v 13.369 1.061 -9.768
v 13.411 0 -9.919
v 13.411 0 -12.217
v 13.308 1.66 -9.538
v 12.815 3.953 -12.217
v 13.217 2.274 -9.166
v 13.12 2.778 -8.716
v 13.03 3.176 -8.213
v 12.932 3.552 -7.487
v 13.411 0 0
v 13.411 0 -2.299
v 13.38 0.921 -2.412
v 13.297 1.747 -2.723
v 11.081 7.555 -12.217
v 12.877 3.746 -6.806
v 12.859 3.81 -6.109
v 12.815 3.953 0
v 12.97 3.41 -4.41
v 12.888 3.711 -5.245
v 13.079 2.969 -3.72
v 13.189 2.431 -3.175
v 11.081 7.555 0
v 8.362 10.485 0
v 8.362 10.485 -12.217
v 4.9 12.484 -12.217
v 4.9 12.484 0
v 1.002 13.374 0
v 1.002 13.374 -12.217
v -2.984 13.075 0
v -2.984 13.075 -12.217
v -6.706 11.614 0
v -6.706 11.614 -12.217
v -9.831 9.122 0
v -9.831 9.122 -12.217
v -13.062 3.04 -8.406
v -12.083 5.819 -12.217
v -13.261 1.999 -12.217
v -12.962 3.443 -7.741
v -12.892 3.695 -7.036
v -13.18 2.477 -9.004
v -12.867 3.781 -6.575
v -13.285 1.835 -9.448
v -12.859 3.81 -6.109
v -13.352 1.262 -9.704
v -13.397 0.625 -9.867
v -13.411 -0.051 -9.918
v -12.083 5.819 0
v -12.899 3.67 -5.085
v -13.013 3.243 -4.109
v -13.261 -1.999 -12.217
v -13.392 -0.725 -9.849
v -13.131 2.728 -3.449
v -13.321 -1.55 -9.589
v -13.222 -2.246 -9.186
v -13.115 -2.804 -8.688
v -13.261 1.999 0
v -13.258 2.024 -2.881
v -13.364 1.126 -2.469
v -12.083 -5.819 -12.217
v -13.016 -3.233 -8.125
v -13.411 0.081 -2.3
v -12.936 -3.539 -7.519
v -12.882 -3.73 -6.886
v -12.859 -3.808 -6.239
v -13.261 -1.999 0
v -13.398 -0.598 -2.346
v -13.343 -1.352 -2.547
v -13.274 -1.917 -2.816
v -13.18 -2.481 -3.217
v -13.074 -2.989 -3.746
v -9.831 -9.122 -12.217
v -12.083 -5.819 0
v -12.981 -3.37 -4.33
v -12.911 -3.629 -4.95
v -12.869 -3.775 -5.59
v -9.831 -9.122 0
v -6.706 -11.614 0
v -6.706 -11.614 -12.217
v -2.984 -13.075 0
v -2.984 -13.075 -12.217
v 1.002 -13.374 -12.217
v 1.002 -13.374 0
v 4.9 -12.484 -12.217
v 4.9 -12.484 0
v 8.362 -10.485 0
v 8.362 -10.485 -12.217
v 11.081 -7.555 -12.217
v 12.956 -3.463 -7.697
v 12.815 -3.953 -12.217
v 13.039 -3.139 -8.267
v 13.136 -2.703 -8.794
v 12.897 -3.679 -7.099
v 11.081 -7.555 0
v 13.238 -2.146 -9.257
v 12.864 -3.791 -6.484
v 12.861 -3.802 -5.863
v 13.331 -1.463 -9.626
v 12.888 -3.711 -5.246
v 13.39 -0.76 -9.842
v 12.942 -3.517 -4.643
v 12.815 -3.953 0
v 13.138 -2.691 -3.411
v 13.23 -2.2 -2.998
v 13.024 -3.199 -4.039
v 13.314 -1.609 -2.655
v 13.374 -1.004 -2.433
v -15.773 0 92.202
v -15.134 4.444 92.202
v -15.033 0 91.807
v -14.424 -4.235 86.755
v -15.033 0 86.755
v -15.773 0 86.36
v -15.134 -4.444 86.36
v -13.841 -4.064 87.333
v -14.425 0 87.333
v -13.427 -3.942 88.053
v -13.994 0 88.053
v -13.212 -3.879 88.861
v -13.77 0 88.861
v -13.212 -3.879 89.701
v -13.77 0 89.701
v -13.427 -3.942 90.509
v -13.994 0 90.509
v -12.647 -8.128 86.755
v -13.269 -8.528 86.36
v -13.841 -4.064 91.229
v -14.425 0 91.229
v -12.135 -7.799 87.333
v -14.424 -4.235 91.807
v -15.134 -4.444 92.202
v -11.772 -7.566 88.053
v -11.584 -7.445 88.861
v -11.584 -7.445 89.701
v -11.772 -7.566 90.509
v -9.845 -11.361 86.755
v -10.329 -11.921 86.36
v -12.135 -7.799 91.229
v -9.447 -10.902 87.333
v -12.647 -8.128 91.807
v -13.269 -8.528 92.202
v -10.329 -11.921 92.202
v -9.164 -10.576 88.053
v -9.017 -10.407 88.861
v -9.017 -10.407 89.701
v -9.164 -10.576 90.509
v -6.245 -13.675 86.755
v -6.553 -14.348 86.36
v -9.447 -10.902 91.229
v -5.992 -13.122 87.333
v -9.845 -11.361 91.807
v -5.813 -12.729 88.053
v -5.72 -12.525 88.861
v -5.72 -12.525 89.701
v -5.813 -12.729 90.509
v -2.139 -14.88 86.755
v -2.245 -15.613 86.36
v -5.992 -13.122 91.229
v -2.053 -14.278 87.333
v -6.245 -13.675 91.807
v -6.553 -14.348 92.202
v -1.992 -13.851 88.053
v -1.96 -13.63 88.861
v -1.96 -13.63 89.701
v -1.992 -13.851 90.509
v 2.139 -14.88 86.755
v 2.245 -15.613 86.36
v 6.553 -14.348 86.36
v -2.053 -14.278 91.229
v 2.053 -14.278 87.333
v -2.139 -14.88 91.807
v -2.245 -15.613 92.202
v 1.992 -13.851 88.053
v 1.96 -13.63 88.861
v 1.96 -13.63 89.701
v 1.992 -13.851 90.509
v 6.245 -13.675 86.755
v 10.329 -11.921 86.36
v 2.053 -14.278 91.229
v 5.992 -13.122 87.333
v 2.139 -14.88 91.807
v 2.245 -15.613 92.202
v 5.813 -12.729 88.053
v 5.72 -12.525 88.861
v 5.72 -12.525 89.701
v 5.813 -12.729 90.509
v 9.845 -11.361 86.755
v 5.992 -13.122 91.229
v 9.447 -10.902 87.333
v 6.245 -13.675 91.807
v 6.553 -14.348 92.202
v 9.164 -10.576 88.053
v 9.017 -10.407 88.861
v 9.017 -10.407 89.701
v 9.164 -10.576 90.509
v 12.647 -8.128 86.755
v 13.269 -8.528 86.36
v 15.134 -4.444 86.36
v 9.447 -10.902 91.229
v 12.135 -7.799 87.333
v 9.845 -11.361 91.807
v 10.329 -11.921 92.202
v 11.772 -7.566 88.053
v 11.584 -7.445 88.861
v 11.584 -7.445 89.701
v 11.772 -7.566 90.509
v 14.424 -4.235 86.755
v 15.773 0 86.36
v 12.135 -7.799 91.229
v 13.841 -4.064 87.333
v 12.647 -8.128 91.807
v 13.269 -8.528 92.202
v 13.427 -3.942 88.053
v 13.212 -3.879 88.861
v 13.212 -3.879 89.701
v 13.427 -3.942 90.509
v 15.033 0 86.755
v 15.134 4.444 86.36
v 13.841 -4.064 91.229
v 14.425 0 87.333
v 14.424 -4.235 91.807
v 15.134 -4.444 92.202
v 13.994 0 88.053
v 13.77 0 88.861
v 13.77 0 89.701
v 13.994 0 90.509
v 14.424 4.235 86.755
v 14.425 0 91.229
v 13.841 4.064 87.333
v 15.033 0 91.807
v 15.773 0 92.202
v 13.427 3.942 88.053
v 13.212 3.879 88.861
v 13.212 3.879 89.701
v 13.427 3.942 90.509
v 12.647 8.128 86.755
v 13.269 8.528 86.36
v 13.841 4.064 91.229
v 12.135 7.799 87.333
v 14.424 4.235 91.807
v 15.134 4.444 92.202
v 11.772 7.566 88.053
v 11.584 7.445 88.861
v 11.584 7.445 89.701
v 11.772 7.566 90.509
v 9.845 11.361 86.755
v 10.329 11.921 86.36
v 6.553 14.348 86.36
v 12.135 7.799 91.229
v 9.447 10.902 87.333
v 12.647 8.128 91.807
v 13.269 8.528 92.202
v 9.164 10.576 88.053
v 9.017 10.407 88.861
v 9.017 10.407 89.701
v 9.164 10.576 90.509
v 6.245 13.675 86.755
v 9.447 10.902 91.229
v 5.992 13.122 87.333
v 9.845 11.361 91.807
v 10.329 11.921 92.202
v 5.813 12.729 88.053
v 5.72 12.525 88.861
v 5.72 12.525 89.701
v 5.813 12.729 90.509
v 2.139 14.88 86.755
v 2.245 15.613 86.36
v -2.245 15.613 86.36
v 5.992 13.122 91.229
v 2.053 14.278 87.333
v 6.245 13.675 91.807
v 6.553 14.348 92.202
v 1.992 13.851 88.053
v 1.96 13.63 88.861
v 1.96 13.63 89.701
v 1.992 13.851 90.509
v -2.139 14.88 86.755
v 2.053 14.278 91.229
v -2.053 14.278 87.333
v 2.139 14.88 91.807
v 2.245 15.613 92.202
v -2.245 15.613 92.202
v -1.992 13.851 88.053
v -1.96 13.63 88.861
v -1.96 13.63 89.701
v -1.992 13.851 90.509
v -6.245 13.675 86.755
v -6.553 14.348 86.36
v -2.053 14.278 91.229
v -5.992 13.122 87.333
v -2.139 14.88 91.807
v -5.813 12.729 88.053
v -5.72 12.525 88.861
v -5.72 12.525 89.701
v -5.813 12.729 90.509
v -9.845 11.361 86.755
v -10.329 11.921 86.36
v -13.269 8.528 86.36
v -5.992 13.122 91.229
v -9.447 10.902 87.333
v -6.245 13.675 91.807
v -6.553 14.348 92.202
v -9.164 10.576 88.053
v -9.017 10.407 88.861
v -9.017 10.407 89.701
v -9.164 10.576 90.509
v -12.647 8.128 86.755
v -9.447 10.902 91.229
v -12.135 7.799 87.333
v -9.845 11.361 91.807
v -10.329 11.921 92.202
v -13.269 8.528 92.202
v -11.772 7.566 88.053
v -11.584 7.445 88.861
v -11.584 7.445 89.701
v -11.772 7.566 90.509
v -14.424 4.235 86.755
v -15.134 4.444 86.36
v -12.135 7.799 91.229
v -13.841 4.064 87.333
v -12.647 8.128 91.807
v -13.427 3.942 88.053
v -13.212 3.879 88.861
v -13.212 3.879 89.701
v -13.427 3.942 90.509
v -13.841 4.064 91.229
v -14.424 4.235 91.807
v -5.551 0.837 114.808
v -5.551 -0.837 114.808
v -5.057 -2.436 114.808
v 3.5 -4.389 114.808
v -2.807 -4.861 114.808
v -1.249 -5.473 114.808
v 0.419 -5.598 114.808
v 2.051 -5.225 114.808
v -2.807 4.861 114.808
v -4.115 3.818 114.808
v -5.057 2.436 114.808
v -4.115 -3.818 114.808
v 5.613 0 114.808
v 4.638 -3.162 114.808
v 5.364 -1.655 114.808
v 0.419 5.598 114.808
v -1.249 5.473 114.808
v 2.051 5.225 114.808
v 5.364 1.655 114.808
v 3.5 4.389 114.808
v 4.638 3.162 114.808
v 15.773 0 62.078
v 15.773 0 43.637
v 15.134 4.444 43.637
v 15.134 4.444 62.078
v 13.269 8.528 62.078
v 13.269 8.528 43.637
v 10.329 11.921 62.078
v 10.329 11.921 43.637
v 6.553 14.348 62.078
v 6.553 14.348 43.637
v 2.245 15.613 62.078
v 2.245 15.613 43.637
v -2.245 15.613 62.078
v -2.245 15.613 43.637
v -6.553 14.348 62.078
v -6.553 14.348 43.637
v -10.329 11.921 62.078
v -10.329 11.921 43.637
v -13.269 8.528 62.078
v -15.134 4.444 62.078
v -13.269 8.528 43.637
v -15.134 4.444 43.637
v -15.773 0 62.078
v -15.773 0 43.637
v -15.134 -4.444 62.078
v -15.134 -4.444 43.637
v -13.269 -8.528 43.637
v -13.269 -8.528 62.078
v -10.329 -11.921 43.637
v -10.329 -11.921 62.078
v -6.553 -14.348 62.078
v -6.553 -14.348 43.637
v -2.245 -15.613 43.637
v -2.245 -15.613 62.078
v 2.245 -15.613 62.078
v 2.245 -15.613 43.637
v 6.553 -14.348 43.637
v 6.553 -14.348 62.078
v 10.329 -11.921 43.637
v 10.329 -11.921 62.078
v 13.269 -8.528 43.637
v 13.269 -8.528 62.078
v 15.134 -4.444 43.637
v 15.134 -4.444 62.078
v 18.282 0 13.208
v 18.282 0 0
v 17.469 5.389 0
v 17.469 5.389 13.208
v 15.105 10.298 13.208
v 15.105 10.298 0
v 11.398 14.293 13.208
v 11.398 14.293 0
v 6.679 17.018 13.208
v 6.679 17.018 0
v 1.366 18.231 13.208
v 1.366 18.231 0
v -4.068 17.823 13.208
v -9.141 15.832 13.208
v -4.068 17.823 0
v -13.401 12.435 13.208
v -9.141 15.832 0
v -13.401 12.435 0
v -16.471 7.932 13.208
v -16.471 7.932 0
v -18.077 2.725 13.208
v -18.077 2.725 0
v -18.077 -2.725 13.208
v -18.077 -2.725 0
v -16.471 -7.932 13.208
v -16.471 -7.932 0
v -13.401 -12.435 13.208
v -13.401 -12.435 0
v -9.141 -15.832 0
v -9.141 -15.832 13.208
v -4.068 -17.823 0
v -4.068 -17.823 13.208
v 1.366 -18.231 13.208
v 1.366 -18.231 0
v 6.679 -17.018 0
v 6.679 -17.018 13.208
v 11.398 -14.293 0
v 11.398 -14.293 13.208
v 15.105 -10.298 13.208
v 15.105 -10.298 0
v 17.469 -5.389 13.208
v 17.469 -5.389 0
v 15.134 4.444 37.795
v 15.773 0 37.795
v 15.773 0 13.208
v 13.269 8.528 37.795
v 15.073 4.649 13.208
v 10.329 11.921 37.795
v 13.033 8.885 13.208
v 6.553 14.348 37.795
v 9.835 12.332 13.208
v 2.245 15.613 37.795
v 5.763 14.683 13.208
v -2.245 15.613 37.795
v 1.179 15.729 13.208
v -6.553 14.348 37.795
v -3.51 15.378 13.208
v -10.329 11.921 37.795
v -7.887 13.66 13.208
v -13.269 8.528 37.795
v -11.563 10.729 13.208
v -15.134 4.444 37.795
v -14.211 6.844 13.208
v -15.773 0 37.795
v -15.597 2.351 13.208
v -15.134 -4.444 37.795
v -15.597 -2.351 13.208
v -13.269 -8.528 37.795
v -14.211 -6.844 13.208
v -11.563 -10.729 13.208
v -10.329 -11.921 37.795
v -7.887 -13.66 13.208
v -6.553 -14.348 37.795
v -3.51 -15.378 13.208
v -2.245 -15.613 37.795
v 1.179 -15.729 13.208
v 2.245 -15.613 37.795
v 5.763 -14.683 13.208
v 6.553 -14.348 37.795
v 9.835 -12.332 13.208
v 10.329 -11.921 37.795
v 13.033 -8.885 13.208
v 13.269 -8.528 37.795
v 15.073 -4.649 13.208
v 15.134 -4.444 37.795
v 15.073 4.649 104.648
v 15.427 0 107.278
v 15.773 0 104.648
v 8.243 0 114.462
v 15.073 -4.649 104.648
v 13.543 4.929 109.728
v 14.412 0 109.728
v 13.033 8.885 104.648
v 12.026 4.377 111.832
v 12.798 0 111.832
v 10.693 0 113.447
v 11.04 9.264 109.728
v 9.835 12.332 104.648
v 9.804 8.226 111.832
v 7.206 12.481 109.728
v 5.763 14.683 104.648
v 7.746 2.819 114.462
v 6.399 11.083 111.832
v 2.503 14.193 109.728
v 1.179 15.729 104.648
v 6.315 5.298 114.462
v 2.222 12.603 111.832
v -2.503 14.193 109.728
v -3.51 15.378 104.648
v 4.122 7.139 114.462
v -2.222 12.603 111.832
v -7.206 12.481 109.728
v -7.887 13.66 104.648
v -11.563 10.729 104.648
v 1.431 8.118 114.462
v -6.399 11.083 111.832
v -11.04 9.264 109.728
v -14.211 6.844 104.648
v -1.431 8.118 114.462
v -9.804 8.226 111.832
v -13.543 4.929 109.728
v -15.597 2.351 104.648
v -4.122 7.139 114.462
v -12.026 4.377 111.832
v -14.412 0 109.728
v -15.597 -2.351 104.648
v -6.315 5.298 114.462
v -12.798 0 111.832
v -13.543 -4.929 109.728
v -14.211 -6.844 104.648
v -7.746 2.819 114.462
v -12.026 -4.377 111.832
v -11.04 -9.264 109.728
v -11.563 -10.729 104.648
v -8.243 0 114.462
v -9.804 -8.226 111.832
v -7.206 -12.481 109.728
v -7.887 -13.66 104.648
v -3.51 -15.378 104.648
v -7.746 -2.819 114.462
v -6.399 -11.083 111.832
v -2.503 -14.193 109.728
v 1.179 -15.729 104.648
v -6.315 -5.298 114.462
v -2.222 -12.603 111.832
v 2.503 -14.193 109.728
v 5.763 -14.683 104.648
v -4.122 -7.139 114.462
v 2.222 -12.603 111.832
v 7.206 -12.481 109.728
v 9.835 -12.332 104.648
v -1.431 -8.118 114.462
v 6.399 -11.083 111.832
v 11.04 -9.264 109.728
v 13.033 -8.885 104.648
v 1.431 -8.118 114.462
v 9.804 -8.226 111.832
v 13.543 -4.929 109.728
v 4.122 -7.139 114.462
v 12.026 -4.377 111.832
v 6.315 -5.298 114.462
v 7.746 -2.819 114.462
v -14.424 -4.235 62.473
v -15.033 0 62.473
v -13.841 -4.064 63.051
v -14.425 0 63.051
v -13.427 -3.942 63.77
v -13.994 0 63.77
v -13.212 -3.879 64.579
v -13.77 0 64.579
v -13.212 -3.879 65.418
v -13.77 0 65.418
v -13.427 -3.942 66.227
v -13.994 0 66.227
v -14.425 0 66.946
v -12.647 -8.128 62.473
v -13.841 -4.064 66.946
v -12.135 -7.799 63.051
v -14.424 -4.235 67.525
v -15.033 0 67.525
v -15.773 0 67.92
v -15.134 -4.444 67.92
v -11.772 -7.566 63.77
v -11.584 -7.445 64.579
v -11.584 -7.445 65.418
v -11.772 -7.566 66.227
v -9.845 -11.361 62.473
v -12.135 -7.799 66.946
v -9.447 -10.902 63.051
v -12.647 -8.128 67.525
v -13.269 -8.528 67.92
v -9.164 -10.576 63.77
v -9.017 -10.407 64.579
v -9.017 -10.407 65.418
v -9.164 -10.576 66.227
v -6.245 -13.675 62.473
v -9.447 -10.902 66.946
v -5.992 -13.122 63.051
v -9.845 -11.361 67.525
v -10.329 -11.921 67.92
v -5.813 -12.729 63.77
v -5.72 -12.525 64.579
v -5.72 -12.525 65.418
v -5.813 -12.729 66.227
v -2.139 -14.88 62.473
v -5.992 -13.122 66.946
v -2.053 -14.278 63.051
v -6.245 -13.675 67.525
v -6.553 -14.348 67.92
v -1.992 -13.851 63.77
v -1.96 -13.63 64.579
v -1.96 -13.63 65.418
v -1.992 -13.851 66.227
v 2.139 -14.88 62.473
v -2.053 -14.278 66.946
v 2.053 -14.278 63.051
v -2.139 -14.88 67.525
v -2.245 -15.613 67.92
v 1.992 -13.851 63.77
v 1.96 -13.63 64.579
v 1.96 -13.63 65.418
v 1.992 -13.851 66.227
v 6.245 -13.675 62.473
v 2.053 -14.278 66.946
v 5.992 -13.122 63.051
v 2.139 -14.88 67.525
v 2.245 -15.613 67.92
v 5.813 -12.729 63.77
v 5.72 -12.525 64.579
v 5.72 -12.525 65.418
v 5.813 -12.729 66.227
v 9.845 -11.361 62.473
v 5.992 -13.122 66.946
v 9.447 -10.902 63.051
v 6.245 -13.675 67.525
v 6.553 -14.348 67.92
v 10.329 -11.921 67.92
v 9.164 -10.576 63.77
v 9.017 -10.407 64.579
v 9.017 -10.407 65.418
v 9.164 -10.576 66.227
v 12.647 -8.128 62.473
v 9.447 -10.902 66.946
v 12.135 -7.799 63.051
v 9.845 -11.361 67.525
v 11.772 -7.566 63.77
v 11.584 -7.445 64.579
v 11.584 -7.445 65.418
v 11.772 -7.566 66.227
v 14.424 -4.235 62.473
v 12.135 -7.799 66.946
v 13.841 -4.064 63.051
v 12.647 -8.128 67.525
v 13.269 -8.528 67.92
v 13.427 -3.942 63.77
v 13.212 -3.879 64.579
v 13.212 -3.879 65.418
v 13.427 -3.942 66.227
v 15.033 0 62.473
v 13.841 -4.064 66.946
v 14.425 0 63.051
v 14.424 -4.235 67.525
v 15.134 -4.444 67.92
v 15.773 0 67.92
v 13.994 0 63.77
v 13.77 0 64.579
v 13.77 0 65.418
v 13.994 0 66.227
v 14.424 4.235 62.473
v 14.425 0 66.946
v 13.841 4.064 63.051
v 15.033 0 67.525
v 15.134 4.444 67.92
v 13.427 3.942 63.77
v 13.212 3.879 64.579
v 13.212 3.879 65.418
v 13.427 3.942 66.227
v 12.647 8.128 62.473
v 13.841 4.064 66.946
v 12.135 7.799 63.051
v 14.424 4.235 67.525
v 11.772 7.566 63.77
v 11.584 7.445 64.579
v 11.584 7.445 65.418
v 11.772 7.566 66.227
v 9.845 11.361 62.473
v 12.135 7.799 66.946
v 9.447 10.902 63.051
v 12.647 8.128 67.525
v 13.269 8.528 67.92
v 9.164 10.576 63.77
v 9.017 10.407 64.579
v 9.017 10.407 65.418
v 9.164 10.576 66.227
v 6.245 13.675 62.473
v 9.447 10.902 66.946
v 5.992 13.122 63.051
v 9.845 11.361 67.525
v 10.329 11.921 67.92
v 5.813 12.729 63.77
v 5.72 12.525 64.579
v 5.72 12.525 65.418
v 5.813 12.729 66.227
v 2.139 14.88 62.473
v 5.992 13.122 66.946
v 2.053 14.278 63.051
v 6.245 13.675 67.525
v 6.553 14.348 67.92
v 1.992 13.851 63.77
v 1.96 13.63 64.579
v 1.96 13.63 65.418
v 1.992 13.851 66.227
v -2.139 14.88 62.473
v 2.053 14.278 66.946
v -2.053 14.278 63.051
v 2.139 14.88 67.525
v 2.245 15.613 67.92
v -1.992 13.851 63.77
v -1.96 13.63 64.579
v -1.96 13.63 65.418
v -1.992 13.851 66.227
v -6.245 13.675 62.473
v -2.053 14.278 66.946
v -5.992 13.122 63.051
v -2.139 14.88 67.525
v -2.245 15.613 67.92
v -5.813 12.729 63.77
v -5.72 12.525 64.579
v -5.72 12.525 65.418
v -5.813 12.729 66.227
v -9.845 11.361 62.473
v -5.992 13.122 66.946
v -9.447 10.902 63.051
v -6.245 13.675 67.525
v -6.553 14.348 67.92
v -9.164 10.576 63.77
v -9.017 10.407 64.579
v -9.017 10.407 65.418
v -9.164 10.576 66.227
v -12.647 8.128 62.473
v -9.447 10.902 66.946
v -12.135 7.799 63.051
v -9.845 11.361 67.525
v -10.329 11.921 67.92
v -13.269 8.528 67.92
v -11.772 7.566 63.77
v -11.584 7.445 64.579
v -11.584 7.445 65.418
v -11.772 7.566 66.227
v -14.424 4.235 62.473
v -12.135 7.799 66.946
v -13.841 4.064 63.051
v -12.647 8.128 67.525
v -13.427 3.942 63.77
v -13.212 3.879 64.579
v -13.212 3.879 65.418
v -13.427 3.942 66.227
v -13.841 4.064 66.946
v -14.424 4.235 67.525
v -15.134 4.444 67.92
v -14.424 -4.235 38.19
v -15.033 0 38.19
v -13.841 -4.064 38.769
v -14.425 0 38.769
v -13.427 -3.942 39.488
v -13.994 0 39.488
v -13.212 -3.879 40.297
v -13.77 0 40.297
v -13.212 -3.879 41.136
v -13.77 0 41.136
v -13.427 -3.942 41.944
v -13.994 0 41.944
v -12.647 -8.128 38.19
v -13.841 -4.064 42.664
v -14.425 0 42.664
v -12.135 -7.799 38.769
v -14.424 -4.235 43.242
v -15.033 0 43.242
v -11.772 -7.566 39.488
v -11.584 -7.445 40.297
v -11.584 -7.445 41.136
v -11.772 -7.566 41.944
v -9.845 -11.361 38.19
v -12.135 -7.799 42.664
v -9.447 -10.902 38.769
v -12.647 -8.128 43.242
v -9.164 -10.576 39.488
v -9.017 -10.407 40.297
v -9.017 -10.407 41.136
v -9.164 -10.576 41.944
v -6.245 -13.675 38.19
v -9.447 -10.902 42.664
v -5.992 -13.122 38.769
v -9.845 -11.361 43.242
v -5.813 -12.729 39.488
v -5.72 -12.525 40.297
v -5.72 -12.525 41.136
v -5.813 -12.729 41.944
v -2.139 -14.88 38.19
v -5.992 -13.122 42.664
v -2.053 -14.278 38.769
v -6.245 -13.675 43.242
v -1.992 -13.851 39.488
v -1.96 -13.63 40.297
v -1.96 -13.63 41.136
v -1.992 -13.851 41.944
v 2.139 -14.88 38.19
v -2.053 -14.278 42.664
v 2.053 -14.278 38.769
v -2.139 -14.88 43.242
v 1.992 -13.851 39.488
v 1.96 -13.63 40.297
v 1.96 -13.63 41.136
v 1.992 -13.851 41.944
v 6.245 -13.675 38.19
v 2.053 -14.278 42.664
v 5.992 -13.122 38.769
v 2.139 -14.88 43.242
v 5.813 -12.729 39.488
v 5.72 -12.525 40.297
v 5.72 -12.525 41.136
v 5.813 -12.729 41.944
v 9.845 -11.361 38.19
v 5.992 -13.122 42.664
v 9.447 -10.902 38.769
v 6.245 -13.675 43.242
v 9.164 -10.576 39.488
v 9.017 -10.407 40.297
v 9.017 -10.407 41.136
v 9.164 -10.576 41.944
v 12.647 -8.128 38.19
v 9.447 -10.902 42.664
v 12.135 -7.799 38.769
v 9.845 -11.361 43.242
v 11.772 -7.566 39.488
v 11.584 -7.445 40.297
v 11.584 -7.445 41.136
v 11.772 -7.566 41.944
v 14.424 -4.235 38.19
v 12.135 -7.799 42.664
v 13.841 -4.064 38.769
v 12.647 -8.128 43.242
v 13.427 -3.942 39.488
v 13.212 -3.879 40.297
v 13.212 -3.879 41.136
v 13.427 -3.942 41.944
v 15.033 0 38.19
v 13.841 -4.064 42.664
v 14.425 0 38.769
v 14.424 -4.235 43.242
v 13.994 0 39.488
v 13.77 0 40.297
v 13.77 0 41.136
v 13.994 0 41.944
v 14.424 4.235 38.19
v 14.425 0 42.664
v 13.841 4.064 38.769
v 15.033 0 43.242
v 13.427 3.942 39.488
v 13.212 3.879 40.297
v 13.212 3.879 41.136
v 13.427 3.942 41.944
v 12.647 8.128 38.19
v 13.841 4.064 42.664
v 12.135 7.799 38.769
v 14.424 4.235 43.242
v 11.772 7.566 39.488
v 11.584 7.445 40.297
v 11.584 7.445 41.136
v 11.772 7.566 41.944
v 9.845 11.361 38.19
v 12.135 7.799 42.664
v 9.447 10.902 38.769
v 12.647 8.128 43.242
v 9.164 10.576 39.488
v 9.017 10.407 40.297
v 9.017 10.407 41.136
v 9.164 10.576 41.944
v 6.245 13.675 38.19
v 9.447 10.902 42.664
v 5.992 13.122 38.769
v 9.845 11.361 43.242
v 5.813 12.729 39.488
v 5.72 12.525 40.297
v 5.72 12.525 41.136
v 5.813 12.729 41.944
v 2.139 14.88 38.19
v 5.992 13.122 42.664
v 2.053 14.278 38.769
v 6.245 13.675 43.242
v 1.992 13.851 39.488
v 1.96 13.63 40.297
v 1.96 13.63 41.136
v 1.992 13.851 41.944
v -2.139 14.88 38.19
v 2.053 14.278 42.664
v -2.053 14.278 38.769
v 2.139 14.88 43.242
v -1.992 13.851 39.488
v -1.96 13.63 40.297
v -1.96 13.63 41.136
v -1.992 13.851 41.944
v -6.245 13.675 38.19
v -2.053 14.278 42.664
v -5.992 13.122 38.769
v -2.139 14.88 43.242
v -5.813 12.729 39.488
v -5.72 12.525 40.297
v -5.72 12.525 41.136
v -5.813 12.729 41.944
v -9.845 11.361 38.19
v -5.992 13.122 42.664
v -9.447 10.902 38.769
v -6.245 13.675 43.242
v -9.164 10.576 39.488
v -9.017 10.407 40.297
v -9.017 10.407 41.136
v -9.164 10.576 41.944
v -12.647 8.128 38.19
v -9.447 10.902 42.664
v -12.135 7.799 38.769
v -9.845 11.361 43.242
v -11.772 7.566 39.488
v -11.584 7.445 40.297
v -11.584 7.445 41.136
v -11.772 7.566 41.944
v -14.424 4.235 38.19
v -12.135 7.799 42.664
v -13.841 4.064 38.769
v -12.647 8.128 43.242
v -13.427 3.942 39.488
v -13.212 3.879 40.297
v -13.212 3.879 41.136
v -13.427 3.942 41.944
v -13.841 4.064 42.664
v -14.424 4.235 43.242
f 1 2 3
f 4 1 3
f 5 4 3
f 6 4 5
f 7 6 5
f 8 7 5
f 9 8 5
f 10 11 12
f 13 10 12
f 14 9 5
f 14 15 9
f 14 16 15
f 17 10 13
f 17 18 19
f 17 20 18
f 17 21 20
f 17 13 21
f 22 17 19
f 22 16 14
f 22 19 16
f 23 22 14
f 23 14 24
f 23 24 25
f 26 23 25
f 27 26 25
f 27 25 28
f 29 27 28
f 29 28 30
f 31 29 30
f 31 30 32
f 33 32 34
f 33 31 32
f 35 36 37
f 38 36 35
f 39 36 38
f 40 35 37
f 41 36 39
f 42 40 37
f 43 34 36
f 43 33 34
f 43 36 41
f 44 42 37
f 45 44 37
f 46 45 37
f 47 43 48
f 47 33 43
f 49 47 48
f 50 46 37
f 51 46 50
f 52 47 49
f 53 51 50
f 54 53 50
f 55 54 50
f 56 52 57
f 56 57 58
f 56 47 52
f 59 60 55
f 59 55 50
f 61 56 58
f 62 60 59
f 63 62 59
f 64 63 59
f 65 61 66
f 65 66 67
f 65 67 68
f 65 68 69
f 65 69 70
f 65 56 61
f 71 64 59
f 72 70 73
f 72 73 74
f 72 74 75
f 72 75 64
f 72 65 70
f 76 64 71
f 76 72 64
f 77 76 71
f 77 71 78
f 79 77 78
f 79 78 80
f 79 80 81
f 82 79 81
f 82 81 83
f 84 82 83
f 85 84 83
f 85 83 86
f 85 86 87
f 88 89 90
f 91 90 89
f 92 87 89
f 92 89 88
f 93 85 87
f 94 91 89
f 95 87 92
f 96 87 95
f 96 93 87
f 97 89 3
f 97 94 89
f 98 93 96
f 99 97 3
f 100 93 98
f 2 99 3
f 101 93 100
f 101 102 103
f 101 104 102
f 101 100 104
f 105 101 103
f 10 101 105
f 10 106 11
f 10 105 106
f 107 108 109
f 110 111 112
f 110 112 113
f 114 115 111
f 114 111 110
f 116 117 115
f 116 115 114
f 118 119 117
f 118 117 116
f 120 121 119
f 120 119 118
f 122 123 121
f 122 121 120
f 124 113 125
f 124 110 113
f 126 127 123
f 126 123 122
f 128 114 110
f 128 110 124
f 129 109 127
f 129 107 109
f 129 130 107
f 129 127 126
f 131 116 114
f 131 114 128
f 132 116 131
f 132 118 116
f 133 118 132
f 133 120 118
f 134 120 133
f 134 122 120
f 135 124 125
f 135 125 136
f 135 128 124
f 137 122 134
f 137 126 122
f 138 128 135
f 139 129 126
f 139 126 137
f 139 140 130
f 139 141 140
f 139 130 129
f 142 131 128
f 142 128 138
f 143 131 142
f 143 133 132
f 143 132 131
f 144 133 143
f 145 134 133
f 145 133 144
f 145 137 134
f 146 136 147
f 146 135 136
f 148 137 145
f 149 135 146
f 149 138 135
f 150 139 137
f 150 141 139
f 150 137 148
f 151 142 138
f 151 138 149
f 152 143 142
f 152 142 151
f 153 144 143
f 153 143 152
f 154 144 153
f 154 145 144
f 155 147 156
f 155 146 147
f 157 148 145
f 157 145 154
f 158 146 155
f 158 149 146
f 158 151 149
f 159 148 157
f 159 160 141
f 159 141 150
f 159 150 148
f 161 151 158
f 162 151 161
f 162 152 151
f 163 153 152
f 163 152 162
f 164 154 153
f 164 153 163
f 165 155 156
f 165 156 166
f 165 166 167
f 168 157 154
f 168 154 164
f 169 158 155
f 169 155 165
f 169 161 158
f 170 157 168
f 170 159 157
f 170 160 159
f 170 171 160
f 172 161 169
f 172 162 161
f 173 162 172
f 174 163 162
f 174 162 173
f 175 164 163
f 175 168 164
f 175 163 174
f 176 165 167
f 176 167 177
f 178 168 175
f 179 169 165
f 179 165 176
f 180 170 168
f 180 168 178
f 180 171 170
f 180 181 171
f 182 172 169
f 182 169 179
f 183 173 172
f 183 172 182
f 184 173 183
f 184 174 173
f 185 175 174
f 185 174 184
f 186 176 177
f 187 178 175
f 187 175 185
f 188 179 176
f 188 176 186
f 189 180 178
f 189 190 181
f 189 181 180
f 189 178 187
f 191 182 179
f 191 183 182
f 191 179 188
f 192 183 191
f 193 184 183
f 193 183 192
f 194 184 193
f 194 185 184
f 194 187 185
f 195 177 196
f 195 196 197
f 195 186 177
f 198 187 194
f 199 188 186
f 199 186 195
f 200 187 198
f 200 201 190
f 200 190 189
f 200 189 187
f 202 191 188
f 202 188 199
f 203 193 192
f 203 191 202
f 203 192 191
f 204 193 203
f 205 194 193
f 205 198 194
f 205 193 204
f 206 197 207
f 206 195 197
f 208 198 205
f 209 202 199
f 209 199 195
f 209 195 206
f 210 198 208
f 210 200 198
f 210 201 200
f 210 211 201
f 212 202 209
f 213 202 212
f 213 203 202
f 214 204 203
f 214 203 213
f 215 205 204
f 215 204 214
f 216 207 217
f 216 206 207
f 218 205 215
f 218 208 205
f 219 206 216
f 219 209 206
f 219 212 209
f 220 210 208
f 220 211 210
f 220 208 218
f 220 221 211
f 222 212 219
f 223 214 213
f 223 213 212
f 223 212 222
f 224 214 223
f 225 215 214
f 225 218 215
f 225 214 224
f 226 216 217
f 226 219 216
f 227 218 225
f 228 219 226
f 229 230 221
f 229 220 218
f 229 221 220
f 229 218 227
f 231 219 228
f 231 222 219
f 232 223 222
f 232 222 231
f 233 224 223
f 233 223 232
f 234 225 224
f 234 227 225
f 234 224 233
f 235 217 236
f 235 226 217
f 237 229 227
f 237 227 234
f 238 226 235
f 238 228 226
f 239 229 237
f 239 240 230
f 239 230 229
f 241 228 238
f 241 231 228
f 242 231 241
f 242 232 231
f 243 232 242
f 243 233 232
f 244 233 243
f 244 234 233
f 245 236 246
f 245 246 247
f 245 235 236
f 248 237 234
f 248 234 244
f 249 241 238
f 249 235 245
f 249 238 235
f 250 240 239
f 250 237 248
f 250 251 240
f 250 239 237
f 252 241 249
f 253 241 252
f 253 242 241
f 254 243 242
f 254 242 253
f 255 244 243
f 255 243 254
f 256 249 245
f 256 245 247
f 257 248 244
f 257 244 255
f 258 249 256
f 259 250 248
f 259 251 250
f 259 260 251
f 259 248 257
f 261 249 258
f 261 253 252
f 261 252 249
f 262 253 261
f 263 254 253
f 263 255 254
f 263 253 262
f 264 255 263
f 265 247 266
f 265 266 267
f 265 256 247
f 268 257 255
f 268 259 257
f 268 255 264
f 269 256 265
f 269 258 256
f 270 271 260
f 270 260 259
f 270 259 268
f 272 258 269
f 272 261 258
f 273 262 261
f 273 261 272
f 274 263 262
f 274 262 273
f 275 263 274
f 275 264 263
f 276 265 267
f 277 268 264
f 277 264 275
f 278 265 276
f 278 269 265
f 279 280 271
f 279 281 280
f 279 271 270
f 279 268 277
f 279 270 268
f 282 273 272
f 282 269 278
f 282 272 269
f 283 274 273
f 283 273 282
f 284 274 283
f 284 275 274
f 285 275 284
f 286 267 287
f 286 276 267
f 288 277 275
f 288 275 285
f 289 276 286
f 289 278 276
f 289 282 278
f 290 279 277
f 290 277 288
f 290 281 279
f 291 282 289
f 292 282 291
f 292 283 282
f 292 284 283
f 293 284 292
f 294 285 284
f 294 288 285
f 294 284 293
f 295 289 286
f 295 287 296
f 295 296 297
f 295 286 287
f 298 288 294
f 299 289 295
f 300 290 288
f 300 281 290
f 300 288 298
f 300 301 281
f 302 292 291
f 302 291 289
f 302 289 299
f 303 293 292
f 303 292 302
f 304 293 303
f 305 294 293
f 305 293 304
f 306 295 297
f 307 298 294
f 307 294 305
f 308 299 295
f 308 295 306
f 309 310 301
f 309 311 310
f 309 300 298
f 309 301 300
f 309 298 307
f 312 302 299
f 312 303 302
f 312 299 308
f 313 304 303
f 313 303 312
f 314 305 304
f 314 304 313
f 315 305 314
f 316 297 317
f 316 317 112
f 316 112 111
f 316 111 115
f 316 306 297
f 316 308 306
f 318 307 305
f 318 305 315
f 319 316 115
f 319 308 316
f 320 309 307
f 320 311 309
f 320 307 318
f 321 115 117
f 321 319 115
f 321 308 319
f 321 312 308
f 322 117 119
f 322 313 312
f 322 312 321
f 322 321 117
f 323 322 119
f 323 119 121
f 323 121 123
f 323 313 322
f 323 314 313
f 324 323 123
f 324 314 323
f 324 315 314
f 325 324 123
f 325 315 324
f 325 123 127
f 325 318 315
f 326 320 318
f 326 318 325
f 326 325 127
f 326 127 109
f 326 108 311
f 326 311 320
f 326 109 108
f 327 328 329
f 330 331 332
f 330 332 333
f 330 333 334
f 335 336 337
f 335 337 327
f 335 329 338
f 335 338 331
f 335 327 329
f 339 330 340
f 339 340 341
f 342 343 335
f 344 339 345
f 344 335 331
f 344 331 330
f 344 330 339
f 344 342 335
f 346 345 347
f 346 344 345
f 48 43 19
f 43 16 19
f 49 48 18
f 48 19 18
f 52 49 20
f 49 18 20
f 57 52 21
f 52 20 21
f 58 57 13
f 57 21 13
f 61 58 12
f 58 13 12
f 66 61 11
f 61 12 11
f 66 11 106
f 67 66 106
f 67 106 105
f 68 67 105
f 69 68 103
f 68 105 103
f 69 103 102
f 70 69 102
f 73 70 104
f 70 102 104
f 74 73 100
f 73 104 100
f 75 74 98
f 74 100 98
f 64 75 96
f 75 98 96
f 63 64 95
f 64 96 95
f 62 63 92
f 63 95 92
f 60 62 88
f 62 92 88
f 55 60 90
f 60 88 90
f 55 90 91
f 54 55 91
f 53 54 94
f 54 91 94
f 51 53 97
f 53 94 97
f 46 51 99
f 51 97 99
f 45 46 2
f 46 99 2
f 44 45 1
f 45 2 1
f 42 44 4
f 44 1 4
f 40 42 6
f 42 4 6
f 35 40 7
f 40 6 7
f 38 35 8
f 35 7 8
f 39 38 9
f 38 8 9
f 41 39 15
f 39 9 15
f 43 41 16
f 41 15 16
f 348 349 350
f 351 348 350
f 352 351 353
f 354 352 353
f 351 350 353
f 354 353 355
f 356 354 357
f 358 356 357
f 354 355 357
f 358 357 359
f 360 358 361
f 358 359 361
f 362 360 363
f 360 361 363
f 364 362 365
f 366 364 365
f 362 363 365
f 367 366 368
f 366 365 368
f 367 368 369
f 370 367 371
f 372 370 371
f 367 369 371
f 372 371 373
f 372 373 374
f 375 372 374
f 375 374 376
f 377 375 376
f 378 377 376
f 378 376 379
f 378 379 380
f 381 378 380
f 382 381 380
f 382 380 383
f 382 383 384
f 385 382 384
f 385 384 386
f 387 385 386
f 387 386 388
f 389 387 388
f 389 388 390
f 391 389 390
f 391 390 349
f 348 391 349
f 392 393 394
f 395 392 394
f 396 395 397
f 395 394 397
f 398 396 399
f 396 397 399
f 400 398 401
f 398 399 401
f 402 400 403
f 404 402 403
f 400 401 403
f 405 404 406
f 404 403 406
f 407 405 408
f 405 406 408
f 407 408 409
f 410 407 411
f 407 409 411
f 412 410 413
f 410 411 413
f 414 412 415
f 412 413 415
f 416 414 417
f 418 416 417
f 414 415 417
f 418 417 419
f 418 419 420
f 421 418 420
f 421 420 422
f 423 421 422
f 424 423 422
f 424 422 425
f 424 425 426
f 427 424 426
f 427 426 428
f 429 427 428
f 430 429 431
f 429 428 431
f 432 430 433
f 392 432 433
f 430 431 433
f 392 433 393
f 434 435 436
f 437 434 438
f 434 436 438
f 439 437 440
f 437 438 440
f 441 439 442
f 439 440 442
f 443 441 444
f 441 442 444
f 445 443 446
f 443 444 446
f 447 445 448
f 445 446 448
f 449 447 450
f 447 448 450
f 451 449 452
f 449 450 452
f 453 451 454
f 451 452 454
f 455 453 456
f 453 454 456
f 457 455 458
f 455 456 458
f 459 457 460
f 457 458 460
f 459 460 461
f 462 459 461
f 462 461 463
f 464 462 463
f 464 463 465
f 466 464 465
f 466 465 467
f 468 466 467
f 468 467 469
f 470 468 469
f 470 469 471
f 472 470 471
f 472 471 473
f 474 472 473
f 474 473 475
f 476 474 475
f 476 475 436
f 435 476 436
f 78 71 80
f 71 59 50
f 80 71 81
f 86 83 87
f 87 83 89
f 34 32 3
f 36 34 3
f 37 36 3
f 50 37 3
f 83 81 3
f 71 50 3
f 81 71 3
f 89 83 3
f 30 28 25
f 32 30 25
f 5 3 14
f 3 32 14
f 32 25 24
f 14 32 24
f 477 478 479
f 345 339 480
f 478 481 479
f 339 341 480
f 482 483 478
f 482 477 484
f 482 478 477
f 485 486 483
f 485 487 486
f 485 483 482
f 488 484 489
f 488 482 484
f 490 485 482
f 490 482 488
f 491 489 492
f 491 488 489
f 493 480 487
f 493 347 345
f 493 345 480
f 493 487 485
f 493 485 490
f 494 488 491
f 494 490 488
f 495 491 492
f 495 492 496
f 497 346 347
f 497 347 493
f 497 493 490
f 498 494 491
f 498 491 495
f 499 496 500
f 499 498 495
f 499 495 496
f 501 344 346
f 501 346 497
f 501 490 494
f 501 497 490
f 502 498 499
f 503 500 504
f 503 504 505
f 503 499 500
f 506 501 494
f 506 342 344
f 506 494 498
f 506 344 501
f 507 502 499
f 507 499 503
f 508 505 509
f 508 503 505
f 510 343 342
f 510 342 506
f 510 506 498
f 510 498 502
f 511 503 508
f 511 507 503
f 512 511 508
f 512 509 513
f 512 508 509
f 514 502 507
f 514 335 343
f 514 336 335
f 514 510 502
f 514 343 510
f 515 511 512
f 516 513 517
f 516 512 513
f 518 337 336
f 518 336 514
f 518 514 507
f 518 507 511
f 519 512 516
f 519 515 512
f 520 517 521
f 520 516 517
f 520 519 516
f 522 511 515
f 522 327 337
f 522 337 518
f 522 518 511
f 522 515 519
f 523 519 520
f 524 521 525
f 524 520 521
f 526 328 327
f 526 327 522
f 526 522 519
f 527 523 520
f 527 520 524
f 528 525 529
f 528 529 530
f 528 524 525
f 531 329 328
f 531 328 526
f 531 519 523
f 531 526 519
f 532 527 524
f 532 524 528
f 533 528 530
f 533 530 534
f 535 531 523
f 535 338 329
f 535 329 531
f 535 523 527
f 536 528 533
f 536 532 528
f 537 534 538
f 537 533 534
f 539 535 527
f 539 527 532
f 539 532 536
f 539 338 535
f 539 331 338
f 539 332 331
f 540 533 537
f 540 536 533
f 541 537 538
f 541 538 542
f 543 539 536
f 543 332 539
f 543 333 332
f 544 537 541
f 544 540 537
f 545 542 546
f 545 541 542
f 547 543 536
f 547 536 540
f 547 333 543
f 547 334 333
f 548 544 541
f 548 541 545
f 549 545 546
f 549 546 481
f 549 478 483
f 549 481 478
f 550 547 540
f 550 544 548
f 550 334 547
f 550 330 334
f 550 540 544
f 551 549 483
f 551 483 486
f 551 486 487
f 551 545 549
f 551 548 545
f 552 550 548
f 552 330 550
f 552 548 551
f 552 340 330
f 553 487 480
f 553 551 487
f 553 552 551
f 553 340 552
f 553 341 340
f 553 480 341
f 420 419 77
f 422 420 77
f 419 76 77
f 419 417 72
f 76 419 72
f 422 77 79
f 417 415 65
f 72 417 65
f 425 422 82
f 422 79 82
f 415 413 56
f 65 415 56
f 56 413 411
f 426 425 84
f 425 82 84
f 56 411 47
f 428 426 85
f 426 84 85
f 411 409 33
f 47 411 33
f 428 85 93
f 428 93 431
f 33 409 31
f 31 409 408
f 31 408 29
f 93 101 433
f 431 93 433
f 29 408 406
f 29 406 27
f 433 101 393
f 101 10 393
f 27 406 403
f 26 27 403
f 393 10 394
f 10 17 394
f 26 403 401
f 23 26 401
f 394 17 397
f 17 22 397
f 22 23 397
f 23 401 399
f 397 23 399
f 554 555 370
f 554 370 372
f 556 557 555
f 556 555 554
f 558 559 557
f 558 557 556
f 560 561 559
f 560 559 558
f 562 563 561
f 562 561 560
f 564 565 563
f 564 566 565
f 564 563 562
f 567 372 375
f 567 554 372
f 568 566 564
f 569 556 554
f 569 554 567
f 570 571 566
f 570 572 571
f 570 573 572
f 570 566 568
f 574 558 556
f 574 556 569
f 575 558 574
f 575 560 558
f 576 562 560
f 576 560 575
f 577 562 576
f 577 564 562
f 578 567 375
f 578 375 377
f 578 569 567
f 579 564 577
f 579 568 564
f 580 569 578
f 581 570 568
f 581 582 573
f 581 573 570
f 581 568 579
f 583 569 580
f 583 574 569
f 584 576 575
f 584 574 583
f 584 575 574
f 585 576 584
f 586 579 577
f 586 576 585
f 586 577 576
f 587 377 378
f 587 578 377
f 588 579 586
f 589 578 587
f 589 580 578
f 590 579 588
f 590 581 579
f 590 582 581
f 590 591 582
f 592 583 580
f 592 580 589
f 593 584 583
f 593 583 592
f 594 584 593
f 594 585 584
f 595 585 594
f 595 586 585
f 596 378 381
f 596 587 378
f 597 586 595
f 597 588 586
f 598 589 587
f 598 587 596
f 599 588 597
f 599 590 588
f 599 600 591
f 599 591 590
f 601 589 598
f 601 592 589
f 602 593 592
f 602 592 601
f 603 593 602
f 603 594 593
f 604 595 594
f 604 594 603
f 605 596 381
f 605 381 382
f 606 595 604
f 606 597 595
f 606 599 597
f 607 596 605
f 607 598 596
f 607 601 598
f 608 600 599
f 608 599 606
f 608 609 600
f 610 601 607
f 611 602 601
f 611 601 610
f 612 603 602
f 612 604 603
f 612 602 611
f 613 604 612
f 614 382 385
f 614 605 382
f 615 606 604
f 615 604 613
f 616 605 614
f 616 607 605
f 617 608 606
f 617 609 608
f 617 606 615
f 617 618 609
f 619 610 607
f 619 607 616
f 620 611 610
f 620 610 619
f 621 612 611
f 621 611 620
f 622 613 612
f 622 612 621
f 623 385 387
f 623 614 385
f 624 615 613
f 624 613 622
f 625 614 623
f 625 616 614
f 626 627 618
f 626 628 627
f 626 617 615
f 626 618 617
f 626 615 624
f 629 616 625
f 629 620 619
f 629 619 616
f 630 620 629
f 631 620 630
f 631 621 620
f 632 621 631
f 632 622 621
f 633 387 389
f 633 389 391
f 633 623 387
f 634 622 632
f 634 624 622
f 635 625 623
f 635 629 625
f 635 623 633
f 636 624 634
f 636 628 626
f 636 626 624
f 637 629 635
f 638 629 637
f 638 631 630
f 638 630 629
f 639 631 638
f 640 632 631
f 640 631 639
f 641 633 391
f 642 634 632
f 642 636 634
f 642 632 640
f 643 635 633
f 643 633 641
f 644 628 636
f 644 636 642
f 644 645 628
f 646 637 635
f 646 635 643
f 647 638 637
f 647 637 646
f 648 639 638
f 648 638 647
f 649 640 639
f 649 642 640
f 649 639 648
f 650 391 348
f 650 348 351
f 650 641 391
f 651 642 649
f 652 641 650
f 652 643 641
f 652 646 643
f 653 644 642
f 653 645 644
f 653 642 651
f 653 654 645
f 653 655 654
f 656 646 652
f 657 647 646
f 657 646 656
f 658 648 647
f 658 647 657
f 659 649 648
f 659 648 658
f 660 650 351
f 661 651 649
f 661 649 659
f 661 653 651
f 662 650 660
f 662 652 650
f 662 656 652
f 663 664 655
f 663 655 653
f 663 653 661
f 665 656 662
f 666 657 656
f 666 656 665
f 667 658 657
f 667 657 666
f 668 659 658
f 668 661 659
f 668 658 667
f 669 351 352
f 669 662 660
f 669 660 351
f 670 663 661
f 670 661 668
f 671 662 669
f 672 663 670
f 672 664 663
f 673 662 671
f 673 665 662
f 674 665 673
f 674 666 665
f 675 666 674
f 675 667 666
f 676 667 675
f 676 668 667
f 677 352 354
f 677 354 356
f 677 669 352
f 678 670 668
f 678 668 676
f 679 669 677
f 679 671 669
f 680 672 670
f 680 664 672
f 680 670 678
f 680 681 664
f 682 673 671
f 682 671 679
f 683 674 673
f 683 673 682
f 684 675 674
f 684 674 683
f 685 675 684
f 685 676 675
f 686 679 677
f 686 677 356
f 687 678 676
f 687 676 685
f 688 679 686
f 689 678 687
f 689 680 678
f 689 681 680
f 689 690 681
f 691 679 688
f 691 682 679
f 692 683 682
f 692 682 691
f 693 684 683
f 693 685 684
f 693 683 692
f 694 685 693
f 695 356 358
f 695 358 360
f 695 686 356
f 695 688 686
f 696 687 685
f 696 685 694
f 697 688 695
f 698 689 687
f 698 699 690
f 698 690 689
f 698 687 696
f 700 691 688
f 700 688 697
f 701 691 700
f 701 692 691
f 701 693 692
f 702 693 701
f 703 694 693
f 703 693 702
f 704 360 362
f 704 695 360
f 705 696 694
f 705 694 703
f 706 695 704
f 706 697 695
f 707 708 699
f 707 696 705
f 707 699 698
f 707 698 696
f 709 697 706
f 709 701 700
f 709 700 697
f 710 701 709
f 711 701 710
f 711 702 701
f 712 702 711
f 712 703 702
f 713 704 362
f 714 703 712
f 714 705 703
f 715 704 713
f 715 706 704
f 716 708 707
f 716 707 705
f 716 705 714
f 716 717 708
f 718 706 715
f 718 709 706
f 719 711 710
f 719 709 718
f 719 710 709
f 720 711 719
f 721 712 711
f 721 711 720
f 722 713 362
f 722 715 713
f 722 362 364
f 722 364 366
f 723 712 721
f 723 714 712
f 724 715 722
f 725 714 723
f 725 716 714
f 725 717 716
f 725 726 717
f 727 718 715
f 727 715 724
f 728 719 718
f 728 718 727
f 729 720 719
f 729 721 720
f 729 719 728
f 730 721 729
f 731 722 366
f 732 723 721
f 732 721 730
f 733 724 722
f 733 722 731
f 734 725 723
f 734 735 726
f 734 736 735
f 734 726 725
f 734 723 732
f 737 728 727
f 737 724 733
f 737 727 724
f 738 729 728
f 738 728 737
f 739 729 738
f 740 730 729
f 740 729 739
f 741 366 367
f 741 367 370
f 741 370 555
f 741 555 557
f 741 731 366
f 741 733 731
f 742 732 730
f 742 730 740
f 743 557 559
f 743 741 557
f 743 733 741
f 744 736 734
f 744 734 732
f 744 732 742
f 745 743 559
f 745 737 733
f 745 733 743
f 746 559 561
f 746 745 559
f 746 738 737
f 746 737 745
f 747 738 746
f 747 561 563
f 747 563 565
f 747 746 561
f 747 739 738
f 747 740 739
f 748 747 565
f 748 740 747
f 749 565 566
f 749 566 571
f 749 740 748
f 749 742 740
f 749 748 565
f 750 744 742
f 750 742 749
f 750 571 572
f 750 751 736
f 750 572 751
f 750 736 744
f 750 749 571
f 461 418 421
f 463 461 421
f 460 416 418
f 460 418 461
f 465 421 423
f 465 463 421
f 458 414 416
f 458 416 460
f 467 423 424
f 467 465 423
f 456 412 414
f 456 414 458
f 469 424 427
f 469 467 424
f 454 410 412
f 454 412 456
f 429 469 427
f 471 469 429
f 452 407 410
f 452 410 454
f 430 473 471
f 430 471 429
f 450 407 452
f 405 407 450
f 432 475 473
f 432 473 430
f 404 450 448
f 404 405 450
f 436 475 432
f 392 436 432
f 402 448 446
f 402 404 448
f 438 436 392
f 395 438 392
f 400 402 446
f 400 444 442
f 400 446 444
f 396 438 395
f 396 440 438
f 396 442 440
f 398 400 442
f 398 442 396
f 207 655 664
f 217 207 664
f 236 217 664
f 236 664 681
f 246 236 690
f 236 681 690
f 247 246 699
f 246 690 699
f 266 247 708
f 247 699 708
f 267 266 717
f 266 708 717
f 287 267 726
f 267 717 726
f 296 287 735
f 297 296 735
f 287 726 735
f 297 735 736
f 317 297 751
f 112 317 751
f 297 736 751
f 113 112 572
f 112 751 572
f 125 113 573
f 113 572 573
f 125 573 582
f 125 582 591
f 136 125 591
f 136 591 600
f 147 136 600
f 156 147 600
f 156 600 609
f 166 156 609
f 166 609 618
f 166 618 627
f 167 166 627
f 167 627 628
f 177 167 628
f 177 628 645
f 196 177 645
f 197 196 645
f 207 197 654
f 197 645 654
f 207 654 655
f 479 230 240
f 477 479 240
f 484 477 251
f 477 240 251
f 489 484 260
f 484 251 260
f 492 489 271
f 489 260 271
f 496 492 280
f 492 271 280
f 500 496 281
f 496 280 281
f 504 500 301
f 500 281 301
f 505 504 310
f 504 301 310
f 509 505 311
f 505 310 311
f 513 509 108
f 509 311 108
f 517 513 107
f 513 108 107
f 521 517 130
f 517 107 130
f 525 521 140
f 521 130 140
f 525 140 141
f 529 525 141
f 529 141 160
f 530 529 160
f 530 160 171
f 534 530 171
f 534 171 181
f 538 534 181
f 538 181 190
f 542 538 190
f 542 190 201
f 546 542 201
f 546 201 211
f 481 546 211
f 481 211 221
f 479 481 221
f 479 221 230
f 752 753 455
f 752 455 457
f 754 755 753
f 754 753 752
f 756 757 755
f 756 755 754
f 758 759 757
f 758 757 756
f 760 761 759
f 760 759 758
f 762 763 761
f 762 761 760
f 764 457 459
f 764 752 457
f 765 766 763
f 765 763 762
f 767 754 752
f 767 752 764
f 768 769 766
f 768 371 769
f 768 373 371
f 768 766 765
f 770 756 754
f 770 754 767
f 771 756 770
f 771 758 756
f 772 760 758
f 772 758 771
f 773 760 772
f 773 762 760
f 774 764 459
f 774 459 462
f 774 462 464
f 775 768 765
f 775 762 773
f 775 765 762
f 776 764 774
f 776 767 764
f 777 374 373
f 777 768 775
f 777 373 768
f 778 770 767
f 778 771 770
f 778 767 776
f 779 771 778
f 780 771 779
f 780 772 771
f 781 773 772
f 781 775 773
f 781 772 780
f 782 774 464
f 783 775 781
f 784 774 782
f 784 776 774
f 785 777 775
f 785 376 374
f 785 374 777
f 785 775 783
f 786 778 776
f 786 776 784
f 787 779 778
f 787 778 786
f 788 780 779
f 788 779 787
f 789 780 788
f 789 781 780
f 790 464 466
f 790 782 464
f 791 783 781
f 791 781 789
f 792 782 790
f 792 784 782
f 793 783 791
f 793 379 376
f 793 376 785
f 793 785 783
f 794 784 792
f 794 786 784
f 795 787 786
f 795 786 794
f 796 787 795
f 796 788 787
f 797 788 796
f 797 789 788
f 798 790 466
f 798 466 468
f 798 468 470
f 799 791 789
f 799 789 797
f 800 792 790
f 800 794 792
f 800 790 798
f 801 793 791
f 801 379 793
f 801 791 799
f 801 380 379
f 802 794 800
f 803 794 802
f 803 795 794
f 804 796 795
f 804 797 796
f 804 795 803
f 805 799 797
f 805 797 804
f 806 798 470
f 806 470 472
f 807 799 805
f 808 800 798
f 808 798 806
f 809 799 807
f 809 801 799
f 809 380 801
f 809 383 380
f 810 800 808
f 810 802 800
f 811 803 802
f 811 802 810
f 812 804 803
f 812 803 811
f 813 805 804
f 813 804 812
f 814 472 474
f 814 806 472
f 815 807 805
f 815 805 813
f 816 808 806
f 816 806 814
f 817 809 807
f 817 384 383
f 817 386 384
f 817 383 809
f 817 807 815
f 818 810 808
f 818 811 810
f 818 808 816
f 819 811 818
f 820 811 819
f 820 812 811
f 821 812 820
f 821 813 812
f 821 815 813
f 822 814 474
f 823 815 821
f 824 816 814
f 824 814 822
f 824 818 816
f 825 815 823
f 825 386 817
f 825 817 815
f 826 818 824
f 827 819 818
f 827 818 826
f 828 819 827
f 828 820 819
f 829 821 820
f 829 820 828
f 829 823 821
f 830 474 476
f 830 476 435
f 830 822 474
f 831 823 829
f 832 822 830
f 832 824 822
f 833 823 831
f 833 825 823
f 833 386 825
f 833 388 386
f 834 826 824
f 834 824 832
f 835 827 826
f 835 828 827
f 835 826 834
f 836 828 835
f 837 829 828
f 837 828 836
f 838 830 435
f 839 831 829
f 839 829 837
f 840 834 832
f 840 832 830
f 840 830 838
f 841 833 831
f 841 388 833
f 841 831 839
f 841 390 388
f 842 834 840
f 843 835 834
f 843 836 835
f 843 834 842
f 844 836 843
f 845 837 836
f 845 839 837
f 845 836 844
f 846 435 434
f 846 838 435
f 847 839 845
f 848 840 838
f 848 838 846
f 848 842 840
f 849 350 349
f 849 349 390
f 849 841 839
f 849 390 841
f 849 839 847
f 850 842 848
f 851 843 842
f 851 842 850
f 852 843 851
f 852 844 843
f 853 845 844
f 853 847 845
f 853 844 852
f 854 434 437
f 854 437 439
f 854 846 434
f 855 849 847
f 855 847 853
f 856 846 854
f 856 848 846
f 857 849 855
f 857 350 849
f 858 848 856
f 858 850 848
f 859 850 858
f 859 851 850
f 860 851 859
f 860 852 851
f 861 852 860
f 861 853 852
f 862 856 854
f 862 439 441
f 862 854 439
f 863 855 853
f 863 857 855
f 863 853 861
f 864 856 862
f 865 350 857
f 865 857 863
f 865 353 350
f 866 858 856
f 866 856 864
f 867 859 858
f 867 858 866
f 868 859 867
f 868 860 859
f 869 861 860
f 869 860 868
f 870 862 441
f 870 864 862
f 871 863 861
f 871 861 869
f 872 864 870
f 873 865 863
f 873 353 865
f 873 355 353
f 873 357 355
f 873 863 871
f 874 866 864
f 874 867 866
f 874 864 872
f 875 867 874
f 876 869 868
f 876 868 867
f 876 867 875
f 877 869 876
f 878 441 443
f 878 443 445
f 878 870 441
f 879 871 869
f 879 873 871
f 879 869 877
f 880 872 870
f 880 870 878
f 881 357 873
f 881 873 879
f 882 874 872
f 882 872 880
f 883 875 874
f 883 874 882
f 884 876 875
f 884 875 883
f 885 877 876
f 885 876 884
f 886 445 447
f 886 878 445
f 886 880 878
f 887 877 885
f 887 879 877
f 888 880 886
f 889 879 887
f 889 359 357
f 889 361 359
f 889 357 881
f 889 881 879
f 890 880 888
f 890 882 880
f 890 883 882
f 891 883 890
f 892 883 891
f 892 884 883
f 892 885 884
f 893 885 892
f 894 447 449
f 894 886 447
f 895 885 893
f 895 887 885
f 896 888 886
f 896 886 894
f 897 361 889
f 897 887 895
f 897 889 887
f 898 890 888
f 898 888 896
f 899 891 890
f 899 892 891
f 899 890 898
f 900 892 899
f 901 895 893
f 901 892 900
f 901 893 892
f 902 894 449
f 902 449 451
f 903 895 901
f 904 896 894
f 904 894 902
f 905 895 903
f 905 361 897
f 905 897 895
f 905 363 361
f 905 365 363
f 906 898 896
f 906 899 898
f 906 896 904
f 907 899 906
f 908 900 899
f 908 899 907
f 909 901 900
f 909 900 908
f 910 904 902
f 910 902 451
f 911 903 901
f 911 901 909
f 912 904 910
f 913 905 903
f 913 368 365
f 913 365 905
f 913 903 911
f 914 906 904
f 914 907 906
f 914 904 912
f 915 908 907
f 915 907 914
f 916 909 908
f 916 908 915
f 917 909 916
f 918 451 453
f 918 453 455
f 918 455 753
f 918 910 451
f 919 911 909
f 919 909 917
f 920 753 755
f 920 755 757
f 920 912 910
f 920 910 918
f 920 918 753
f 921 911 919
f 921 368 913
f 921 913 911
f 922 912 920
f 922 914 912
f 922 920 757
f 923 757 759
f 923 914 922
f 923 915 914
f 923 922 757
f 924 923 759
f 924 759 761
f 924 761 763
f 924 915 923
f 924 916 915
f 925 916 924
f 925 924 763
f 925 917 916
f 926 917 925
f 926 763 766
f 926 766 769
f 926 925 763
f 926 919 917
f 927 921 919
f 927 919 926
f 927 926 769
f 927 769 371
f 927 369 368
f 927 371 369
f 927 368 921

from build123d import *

# Parameters (mm, degrees)
F0_R     = 13.4112
F1_DEPTH = 12.2174
F0_R_2   = 15.7734
F2_DEPTH = 114.808
F0_R_3   = 18.28165
F3_DEPTH = 13.208
F4_R     = 10.16
F8_R     = 3.81
F9_DEPTH = 25.4


with BuildPart() as f1:
    # F0 (on Top) → F1 (new body)
    with BuildSketch(Plane.XY):
        Circle(F0_R)
    extrude(amount=-F1_DEPTH)

    # F0 (on Top) → F2 (join)
    with BuildSketch(Plane.XY):
        Circle(F0_R_2)
        Circle(F0_R, mode=Mode.SUBTRACT)
        Circle(F0_R)
    extrude(amount=F2_DEPTH)

    # F0 (on Top) → F3 (join)
    with BuildSketch(Plane.XY):
        Circle(F0_R_3)
        Circle(F0_R_2, mode=Mode.SUBTRACT)
    extrude(amount=F3_DEPTH)

    # F4
    f4_edges = [f1.edges().sort_by_distance(p)[0] for p in [
        (-15.7734, 0, 114.808),
    ]]
    fillet(f4_edges, radius=F4_R)

    # F5 (on Front) → F6 (revolve, cut)
    with BuildSketch(Plane.XZ):
        with BuildLine():
            Line((-15.7734, 43.6372), (-15.7734, 37.7952))
            ThreePointArc((-15.7734, 37.7952), (-13.7414, 40.7162), (-15.7734, 43.6372))
        make_face()
    revolve(axis=Axis((0, 0, 52.324), (0, 0, 1)), mode=Mode.SUBTRACT)

    # F5 (on Front) → F7 (revolve, cut)
    with BuildSketch(Plane.XZ):
        with BuildLine():
            Line((-15.7734, 92.202), (-15.7734, 86.36))
            ThreePointArc((-15.7734, 86.36), (-13.7414, 89.281), (-15.7734, 92.202))
        make_face()
        with BuildLine():
            Line((-15.7734, 67.9196), (-15.7734, 62.0776))
            ThreePointArc((-15.7734, 62.0776), (-13.7414, 64.9986), (-15.7734, 67.9196))
        make_face()
    revolve(axis=Axis((0, 0, 52.324), (0, 0, 1)), mode=Mode.SUBTRACT)

    # F8 (on Right) → F9 (cut, symmetric)
    with BuildSketch(Plane.YZ):
        with Locations((0, -6.1087)):
            Circle(F8_R)
    extrude(amount=F9_DEPTH, both=True, mode=Mode.SUBTRACT)


solid = f1.part
